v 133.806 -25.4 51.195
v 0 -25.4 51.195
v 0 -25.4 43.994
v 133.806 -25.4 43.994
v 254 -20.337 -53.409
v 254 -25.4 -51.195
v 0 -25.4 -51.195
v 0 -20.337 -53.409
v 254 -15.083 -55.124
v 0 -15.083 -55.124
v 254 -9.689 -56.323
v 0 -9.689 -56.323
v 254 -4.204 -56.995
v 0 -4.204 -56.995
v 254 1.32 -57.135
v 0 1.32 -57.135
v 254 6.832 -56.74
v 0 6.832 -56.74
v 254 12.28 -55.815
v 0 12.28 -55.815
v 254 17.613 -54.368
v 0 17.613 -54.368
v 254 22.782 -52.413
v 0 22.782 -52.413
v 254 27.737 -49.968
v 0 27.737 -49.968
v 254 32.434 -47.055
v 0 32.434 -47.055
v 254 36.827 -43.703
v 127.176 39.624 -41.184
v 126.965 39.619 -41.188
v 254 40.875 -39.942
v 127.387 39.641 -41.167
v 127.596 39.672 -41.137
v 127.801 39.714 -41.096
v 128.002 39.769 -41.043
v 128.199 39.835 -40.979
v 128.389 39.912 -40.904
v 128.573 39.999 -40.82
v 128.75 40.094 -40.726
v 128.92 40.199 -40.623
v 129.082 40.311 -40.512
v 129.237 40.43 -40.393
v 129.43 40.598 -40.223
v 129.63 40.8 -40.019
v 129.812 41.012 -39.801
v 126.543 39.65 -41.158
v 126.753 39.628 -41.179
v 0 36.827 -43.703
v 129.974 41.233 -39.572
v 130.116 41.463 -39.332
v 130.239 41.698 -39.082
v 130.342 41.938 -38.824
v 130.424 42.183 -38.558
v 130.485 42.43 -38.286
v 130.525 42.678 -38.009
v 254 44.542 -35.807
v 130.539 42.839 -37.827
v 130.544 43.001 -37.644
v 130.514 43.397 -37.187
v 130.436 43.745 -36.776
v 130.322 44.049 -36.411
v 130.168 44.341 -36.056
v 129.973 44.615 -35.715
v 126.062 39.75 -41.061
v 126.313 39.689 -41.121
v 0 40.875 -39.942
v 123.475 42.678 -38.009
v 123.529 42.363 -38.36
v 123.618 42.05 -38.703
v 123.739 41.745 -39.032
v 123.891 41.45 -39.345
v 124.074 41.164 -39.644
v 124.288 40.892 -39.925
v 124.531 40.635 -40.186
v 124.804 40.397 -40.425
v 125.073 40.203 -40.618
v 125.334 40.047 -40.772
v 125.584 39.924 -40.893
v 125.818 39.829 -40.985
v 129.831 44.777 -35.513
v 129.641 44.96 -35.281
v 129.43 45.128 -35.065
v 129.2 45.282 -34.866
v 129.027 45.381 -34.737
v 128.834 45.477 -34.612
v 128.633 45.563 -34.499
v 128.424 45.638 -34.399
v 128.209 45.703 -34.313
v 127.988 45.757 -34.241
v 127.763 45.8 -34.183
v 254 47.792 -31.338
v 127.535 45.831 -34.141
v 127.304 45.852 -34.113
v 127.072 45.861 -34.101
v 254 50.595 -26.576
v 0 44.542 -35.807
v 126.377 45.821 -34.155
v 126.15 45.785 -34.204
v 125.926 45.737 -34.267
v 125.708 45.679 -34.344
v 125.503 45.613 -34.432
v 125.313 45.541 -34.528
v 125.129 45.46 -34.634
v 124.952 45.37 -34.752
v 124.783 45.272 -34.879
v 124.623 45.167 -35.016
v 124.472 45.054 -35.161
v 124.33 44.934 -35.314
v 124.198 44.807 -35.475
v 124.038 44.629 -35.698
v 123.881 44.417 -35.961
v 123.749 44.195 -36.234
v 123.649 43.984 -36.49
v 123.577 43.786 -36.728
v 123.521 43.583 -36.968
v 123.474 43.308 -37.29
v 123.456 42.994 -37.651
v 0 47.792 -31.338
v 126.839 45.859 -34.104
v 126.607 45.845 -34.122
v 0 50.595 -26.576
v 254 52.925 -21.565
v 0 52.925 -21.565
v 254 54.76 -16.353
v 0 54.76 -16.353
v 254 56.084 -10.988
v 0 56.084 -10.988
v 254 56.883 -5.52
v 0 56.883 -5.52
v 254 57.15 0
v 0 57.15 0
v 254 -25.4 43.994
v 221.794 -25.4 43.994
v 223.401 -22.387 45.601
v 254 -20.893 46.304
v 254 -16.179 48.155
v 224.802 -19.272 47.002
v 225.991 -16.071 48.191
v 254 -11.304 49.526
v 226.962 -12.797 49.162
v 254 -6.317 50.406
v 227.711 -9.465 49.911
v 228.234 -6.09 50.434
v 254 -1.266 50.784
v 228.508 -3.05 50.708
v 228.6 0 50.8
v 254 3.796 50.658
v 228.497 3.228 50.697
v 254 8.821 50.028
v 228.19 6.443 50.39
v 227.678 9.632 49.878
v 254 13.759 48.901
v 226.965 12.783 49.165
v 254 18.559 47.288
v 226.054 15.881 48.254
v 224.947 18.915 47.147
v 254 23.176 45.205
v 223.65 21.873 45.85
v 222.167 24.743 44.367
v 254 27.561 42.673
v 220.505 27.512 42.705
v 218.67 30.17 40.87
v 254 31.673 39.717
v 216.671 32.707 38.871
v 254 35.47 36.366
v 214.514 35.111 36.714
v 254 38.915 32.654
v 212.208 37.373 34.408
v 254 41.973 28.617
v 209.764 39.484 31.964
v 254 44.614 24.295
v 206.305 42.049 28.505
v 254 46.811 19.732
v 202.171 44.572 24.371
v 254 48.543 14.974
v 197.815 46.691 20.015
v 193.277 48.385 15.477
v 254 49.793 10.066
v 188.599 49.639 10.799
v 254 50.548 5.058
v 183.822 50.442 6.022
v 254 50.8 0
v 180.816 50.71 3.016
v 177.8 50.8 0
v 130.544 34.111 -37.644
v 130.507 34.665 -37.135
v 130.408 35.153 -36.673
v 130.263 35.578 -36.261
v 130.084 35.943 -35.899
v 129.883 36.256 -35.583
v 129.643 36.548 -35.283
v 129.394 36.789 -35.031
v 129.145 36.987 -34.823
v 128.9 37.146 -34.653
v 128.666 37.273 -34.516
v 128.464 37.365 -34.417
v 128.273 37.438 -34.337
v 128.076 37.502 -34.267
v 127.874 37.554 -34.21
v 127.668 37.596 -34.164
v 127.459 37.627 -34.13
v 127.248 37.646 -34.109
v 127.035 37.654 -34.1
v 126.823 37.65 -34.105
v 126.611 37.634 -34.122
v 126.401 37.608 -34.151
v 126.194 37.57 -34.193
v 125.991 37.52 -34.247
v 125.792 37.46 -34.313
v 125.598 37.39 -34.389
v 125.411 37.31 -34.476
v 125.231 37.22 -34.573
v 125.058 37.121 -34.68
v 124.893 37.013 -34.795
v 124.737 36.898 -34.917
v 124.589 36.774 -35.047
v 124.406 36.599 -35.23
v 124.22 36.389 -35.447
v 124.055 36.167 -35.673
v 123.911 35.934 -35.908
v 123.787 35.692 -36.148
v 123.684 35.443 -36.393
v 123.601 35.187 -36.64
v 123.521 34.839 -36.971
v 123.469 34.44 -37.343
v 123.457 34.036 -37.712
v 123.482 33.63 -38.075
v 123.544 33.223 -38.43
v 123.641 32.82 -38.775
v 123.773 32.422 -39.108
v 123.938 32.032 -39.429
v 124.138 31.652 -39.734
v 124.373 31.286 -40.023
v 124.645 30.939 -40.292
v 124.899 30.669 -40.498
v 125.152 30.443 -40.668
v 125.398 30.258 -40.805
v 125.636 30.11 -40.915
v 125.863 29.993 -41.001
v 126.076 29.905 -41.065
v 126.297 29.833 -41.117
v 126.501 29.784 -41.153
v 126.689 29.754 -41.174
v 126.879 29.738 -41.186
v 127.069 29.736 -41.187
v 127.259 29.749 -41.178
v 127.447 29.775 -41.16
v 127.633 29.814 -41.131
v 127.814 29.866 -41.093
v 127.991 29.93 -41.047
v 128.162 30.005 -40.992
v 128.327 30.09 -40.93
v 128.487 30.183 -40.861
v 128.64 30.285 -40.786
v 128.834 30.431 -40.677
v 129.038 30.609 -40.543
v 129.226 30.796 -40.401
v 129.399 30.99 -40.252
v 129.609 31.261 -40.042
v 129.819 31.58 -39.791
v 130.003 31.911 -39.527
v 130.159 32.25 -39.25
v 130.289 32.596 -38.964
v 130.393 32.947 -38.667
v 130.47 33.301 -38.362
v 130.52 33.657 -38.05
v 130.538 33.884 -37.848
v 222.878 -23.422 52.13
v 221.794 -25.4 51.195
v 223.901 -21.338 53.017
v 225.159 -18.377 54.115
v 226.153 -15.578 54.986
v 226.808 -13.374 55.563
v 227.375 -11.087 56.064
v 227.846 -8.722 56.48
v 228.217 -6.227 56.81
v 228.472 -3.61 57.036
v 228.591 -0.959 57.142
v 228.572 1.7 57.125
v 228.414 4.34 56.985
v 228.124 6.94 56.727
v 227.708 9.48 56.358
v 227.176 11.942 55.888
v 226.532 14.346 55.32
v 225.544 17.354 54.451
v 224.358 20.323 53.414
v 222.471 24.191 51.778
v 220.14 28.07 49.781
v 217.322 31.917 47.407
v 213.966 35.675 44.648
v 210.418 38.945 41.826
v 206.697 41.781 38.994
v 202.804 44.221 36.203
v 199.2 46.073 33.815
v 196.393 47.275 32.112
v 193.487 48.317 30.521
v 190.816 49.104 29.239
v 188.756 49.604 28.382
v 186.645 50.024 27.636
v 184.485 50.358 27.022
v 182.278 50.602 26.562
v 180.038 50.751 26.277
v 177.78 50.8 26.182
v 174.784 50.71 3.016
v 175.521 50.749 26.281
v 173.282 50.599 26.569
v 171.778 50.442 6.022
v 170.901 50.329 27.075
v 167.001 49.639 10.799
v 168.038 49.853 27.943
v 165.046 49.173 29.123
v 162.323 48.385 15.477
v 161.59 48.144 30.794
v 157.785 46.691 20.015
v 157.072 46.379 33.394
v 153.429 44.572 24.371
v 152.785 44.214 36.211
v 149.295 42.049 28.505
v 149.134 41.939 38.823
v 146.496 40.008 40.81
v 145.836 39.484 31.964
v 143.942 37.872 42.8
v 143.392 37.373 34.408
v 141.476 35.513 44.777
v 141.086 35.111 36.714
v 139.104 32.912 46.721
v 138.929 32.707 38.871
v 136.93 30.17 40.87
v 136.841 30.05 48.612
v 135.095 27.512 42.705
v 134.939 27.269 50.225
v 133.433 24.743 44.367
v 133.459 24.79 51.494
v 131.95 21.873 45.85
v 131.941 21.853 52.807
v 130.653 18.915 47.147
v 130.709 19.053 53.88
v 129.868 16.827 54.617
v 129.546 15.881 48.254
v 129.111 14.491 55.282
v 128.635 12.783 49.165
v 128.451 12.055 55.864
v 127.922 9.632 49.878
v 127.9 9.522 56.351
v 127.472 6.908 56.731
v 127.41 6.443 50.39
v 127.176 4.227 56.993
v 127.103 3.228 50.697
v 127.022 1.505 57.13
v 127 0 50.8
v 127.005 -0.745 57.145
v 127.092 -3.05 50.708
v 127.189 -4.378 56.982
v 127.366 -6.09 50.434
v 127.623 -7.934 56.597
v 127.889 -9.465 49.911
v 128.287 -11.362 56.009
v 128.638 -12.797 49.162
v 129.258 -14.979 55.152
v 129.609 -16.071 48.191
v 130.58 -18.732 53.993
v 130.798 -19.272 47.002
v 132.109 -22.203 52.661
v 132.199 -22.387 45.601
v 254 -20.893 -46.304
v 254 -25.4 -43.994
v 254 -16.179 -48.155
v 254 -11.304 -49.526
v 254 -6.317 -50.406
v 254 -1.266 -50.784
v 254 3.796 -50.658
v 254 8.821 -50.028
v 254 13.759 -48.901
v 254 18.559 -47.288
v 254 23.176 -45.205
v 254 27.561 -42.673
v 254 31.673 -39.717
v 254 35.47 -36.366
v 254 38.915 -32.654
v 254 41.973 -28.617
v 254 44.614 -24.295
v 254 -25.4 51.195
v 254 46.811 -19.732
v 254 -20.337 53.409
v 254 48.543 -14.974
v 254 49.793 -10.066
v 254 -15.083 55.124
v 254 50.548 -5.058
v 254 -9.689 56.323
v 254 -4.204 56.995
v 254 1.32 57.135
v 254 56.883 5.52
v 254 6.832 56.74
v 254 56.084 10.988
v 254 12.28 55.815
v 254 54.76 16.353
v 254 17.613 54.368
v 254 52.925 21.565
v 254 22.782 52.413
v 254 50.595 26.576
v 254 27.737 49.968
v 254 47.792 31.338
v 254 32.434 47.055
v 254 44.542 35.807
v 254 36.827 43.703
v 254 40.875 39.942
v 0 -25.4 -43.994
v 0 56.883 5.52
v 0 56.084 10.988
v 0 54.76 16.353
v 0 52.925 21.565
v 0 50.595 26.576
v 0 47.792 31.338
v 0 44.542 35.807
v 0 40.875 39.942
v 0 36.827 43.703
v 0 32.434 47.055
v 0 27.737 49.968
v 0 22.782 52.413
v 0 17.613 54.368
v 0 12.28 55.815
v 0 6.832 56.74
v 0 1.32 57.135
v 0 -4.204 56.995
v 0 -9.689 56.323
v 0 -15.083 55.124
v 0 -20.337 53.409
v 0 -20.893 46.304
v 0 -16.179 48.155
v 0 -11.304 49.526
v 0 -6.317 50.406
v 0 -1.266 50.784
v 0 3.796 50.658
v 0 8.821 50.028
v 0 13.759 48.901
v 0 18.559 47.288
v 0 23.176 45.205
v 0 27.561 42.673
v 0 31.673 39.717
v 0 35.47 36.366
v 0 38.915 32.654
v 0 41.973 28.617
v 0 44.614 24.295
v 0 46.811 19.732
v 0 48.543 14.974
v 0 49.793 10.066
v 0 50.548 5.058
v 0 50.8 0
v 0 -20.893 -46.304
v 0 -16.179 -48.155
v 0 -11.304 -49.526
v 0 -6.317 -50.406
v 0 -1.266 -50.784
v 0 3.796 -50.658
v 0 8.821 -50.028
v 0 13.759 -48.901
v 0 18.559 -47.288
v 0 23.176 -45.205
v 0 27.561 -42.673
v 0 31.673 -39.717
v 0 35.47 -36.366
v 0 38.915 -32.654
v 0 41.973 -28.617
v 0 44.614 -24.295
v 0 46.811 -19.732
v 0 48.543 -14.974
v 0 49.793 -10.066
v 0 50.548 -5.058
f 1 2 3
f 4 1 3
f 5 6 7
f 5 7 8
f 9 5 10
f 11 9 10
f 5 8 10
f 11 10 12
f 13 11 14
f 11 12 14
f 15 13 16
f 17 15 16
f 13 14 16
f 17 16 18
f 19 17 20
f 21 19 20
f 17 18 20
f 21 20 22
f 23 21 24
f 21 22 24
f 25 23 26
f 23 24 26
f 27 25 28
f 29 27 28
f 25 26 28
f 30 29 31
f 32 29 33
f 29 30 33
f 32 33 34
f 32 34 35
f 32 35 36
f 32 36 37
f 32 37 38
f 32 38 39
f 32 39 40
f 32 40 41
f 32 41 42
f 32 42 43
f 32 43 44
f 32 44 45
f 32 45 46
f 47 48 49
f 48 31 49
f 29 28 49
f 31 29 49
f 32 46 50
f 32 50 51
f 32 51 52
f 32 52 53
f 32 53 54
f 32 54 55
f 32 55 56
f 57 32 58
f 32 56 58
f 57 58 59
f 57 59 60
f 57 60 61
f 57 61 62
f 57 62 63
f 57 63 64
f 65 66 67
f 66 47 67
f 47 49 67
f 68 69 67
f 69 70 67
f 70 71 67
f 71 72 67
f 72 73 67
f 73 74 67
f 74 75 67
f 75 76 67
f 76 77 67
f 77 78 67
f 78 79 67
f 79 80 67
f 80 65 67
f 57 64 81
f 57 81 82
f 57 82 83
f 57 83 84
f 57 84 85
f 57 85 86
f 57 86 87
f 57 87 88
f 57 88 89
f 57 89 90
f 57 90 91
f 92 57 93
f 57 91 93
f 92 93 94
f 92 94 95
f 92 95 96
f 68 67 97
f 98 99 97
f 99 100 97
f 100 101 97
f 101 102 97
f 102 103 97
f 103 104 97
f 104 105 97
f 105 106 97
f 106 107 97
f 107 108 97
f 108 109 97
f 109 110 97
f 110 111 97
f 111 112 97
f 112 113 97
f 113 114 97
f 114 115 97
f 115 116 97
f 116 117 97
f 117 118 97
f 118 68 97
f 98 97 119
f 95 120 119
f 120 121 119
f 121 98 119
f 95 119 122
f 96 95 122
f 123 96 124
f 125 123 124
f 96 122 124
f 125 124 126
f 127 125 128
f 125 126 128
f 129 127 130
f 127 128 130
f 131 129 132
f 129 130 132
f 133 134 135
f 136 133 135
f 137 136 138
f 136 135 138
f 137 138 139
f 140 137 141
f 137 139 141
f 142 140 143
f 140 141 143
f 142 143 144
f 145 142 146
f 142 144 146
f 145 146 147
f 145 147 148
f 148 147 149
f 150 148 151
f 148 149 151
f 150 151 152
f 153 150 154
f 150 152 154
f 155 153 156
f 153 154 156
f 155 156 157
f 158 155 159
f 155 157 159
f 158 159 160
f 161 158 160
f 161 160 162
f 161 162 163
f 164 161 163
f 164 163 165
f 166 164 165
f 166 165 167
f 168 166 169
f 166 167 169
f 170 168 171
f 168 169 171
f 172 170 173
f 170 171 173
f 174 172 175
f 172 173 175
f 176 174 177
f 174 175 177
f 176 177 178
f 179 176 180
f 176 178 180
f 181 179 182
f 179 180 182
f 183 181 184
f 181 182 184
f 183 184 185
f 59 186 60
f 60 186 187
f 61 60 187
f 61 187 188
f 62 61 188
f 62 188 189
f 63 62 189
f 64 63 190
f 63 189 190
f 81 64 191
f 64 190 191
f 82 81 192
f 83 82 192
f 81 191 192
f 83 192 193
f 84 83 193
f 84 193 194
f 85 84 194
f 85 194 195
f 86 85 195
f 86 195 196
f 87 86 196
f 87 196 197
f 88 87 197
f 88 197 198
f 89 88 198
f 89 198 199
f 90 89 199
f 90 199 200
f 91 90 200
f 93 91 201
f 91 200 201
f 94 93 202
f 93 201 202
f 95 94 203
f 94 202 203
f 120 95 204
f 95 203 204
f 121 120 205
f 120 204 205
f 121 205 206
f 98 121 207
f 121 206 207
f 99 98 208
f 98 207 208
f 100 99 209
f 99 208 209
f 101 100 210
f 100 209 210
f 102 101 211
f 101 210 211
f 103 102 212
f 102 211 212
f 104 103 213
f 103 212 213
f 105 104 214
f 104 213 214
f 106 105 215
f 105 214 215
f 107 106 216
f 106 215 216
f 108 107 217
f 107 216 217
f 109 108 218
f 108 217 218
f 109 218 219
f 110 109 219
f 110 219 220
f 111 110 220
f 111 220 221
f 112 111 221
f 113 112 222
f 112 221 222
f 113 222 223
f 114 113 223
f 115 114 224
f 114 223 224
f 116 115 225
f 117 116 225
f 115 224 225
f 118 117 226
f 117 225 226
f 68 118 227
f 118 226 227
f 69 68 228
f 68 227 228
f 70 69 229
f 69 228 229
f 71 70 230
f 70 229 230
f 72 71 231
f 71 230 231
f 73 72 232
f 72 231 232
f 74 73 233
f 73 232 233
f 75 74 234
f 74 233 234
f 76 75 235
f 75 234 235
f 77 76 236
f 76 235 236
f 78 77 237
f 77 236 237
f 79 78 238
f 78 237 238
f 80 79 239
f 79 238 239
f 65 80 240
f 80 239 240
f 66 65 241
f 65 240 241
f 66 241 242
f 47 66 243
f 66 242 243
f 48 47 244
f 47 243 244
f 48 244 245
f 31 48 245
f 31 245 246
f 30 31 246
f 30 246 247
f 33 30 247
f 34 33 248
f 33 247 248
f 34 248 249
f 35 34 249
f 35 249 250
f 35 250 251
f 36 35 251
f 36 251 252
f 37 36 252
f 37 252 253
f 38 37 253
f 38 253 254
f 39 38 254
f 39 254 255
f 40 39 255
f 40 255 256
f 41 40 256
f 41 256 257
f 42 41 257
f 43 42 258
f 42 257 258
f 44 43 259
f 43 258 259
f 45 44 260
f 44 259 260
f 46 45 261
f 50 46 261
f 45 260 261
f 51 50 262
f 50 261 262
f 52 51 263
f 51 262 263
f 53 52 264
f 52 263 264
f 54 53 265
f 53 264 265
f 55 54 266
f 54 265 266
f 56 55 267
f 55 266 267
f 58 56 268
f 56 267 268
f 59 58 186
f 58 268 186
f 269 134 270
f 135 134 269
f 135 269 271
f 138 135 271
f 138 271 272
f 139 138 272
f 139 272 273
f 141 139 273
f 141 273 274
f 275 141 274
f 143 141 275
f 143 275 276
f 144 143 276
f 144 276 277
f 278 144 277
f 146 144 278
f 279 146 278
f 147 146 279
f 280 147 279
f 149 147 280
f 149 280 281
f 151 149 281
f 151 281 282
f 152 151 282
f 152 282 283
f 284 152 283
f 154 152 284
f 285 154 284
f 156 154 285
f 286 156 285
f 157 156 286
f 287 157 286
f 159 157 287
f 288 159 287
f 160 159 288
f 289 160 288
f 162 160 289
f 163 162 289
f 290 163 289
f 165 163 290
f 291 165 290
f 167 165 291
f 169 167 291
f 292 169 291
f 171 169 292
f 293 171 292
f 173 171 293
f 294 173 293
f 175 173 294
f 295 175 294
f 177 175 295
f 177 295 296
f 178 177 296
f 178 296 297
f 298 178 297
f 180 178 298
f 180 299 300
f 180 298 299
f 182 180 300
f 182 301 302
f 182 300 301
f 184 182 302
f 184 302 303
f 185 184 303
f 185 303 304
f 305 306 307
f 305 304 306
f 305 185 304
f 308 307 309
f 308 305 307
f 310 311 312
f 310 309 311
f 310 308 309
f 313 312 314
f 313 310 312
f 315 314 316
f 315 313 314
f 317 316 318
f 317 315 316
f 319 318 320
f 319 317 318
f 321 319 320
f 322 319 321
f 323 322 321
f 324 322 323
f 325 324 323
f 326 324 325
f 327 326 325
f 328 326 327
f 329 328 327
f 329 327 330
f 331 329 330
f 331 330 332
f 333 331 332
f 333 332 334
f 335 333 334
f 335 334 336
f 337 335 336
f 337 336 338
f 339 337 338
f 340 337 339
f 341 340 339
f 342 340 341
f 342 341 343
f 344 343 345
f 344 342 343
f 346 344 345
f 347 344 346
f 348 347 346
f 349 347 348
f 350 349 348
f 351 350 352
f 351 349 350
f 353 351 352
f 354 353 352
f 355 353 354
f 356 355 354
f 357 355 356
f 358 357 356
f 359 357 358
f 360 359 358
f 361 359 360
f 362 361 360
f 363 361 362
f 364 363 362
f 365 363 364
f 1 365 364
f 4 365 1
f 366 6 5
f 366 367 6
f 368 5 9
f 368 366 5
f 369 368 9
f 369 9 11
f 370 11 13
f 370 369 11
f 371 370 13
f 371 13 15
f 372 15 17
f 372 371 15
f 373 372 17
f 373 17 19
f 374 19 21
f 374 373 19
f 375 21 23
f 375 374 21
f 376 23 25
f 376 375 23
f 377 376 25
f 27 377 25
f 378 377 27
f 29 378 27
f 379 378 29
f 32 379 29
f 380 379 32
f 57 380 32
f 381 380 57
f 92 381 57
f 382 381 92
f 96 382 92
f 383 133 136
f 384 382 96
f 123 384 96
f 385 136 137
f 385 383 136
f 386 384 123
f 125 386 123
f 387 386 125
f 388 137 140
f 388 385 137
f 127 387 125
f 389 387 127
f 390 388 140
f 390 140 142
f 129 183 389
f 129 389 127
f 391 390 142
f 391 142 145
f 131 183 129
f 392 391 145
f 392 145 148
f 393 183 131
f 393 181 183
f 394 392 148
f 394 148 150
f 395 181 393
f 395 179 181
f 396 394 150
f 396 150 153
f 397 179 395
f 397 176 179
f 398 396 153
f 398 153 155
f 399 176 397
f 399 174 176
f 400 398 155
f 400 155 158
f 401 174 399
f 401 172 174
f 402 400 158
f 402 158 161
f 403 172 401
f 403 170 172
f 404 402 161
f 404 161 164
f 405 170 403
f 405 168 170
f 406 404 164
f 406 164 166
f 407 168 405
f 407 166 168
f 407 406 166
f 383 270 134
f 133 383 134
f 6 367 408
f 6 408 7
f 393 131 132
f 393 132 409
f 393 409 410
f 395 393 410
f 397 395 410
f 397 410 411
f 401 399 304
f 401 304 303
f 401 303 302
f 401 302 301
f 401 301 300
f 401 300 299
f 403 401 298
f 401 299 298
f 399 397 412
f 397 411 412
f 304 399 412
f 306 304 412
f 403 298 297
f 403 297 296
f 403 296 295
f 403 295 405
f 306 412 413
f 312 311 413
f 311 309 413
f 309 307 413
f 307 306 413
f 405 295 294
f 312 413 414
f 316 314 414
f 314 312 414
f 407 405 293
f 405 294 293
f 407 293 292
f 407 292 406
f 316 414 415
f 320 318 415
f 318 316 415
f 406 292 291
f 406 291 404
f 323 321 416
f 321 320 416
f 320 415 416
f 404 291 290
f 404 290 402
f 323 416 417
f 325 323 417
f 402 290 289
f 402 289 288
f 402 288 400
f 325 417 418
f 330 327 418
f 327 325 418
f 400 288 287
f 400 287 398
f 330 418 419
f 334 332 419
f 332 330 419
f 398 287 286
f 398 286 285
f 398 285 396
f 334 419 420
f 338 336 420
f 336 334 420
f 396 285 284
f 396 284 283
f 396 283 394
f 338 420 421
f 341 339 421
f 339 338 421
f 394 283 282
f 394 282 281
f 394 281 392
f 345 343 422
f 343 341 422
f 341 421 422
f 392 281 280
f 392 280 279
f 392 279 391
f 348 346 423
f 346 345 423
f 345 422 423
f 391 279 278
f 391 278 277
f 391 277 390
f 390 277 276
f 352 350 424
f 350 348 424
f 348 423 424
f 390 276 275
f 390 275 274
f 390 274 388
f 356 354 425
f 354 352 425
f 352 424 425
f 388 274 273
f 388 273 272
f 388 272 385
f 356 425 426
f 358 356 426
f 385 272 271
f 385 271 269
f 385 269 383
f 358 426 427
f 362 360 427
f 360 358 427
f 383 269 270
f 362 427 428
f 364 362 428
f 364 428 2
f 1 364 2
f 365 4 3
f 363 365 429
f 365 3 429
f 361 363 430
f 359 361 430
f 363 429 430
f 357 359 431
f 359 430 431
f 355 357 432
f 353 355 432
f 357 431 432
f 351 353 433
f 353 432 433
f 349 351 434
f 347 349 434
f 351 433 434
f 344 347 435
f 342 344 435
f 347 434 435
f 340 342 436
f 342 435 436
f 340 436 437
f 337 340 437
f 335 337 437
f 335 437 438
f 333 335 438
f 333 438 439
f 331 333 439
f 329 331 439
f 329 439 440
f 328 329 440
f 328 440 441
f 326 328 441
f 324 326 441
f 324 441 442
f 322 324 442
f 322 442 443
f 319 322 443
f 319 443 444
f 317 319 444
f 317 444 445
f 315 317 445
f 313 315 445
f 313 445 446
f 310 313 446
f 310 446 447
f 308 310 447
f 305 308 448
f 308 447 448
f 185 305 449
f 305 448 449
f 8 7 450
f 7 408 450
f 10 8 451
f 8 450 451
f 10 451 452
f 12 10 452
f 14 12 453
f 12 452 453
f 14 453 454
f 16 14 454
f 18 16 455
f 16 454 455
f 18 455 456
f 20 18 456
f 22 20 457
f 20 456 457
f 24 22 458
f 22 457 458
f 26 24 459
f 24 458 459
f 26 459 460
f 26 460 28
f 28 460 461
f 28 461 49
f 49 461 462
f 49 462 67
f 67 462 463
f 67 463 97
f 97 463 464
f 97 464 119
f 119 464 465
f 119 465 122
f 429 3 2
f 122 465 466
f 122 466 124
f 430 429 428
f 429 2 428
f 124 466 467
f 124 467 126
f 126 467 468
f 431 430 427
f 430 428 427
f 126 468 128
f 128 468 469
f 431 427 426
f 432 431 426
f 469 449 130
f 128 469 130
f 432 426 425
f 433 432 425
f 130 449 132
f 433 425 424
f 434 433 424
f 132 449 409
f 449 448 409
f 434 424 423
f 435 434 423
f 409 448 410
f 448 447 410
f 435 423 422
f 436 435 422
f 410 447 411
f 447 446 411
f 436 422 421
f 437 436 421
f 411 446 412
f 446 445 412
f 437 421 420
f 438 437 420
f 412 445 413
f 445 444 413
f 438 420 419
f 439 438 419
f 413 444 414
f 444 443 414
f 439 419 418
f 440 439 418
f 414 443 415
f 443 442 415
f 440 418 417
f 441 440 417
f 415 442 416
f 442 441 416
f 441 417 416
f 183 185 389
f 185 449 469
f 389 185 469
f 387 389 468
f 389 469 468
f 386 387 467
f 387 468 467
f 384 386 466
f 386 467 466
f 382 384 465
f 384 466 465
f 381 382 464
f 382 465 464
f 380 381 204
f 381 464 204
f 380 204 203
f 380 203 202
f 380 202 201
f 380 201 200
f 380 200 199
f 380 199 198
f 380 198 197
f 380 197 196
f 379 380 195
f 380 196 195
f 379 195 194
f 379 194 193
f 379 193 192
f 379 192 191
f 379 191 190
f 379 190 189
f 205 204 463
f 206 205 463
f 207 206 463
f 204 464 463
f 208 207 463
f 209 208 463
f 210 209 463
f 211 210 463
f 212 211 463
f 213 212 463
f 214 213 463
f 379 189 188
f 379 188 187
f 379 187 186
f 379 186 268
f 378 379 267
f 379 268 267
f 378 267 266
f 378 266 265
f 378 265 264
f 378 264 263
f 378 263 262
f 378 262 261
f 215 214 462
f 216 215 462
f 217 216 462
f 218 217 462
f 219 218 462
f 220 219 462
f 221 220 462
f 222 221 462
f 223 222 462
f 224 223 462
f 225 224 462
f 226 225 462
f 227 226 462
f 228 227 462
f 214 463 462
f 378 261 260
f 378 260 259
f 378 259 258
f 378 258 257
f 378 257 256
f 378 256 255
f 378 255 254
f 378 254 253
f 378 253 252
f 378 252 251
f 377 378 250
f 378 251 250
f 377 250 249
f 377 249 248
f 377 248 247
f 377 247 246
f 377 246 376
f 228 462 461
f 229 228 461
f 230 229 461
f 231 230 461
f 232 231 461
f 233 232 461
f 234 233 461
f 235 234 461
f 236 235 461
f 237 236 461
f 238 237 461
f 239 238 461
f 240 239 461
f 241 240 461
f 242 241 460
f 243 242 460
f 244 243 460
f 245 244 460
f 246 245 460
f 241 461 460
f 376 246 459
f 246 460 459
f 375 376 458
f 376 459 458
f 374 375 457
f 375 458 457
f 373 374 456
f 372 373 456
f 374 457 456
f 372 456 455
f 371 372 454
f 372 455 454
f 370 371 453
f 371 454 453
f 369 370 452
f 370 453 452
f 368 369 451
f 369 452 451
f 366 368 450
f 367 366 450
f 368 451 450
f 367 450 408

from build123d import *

# Parameters (mm, degrees)
F1_DEPTH = 254
F2_R     = 50.8
F3_DEPTH = 148.336
F4_R     = 3.5438388493
F5_DEPTH = 89.916


with BuildPart() as f1:
    # F0 (on Right) → F1 (new body)
    with BuildSketch(Plane.YZ):
        with BuildLine():
            ThreePointArc((-25.4, -51.1953367017), (30.1206947131, -48.568160867), (57.15, 0))
            ThreePointArc((57.15, 0), (30.1206947131, 48.568160867), (-25.4, 51.1953367017))
            Line((-25.4, 51.1953367017), (-25.4, 43.9940905122))
            ThreePointArc((-25.4, 43.9940905122), (25.4, 43.9940905122), (50.8, 0))
            ThreePointArc((50.8, 0), (25.4, -43.9940905122), (-25.4, -43.9940905122))
            Line((-25.4, -43.9940905122), (-25.4, -51.1953367017))
        make_face()
    extrude(amount=F1_DEPTH)

    # F2 (on Top) → F3 (cut)
    with BuildSketch(Plane.XY):
        with Locations((177.8, 0)):
            Circle(F2_R)
    extrude(amount=F3_DEPTH, mode=Mode.SUBTRACT)

    # F4 (on Front) → F5 (cut)
    with BuildSketch(Plane.XZ):
        with Locations((127, -37.6440905122)):
            Circle(F4_R)
    extrude(amount=-F5_DEPTH, mode=Mode.SUBTRACT)


solid = f1.part
